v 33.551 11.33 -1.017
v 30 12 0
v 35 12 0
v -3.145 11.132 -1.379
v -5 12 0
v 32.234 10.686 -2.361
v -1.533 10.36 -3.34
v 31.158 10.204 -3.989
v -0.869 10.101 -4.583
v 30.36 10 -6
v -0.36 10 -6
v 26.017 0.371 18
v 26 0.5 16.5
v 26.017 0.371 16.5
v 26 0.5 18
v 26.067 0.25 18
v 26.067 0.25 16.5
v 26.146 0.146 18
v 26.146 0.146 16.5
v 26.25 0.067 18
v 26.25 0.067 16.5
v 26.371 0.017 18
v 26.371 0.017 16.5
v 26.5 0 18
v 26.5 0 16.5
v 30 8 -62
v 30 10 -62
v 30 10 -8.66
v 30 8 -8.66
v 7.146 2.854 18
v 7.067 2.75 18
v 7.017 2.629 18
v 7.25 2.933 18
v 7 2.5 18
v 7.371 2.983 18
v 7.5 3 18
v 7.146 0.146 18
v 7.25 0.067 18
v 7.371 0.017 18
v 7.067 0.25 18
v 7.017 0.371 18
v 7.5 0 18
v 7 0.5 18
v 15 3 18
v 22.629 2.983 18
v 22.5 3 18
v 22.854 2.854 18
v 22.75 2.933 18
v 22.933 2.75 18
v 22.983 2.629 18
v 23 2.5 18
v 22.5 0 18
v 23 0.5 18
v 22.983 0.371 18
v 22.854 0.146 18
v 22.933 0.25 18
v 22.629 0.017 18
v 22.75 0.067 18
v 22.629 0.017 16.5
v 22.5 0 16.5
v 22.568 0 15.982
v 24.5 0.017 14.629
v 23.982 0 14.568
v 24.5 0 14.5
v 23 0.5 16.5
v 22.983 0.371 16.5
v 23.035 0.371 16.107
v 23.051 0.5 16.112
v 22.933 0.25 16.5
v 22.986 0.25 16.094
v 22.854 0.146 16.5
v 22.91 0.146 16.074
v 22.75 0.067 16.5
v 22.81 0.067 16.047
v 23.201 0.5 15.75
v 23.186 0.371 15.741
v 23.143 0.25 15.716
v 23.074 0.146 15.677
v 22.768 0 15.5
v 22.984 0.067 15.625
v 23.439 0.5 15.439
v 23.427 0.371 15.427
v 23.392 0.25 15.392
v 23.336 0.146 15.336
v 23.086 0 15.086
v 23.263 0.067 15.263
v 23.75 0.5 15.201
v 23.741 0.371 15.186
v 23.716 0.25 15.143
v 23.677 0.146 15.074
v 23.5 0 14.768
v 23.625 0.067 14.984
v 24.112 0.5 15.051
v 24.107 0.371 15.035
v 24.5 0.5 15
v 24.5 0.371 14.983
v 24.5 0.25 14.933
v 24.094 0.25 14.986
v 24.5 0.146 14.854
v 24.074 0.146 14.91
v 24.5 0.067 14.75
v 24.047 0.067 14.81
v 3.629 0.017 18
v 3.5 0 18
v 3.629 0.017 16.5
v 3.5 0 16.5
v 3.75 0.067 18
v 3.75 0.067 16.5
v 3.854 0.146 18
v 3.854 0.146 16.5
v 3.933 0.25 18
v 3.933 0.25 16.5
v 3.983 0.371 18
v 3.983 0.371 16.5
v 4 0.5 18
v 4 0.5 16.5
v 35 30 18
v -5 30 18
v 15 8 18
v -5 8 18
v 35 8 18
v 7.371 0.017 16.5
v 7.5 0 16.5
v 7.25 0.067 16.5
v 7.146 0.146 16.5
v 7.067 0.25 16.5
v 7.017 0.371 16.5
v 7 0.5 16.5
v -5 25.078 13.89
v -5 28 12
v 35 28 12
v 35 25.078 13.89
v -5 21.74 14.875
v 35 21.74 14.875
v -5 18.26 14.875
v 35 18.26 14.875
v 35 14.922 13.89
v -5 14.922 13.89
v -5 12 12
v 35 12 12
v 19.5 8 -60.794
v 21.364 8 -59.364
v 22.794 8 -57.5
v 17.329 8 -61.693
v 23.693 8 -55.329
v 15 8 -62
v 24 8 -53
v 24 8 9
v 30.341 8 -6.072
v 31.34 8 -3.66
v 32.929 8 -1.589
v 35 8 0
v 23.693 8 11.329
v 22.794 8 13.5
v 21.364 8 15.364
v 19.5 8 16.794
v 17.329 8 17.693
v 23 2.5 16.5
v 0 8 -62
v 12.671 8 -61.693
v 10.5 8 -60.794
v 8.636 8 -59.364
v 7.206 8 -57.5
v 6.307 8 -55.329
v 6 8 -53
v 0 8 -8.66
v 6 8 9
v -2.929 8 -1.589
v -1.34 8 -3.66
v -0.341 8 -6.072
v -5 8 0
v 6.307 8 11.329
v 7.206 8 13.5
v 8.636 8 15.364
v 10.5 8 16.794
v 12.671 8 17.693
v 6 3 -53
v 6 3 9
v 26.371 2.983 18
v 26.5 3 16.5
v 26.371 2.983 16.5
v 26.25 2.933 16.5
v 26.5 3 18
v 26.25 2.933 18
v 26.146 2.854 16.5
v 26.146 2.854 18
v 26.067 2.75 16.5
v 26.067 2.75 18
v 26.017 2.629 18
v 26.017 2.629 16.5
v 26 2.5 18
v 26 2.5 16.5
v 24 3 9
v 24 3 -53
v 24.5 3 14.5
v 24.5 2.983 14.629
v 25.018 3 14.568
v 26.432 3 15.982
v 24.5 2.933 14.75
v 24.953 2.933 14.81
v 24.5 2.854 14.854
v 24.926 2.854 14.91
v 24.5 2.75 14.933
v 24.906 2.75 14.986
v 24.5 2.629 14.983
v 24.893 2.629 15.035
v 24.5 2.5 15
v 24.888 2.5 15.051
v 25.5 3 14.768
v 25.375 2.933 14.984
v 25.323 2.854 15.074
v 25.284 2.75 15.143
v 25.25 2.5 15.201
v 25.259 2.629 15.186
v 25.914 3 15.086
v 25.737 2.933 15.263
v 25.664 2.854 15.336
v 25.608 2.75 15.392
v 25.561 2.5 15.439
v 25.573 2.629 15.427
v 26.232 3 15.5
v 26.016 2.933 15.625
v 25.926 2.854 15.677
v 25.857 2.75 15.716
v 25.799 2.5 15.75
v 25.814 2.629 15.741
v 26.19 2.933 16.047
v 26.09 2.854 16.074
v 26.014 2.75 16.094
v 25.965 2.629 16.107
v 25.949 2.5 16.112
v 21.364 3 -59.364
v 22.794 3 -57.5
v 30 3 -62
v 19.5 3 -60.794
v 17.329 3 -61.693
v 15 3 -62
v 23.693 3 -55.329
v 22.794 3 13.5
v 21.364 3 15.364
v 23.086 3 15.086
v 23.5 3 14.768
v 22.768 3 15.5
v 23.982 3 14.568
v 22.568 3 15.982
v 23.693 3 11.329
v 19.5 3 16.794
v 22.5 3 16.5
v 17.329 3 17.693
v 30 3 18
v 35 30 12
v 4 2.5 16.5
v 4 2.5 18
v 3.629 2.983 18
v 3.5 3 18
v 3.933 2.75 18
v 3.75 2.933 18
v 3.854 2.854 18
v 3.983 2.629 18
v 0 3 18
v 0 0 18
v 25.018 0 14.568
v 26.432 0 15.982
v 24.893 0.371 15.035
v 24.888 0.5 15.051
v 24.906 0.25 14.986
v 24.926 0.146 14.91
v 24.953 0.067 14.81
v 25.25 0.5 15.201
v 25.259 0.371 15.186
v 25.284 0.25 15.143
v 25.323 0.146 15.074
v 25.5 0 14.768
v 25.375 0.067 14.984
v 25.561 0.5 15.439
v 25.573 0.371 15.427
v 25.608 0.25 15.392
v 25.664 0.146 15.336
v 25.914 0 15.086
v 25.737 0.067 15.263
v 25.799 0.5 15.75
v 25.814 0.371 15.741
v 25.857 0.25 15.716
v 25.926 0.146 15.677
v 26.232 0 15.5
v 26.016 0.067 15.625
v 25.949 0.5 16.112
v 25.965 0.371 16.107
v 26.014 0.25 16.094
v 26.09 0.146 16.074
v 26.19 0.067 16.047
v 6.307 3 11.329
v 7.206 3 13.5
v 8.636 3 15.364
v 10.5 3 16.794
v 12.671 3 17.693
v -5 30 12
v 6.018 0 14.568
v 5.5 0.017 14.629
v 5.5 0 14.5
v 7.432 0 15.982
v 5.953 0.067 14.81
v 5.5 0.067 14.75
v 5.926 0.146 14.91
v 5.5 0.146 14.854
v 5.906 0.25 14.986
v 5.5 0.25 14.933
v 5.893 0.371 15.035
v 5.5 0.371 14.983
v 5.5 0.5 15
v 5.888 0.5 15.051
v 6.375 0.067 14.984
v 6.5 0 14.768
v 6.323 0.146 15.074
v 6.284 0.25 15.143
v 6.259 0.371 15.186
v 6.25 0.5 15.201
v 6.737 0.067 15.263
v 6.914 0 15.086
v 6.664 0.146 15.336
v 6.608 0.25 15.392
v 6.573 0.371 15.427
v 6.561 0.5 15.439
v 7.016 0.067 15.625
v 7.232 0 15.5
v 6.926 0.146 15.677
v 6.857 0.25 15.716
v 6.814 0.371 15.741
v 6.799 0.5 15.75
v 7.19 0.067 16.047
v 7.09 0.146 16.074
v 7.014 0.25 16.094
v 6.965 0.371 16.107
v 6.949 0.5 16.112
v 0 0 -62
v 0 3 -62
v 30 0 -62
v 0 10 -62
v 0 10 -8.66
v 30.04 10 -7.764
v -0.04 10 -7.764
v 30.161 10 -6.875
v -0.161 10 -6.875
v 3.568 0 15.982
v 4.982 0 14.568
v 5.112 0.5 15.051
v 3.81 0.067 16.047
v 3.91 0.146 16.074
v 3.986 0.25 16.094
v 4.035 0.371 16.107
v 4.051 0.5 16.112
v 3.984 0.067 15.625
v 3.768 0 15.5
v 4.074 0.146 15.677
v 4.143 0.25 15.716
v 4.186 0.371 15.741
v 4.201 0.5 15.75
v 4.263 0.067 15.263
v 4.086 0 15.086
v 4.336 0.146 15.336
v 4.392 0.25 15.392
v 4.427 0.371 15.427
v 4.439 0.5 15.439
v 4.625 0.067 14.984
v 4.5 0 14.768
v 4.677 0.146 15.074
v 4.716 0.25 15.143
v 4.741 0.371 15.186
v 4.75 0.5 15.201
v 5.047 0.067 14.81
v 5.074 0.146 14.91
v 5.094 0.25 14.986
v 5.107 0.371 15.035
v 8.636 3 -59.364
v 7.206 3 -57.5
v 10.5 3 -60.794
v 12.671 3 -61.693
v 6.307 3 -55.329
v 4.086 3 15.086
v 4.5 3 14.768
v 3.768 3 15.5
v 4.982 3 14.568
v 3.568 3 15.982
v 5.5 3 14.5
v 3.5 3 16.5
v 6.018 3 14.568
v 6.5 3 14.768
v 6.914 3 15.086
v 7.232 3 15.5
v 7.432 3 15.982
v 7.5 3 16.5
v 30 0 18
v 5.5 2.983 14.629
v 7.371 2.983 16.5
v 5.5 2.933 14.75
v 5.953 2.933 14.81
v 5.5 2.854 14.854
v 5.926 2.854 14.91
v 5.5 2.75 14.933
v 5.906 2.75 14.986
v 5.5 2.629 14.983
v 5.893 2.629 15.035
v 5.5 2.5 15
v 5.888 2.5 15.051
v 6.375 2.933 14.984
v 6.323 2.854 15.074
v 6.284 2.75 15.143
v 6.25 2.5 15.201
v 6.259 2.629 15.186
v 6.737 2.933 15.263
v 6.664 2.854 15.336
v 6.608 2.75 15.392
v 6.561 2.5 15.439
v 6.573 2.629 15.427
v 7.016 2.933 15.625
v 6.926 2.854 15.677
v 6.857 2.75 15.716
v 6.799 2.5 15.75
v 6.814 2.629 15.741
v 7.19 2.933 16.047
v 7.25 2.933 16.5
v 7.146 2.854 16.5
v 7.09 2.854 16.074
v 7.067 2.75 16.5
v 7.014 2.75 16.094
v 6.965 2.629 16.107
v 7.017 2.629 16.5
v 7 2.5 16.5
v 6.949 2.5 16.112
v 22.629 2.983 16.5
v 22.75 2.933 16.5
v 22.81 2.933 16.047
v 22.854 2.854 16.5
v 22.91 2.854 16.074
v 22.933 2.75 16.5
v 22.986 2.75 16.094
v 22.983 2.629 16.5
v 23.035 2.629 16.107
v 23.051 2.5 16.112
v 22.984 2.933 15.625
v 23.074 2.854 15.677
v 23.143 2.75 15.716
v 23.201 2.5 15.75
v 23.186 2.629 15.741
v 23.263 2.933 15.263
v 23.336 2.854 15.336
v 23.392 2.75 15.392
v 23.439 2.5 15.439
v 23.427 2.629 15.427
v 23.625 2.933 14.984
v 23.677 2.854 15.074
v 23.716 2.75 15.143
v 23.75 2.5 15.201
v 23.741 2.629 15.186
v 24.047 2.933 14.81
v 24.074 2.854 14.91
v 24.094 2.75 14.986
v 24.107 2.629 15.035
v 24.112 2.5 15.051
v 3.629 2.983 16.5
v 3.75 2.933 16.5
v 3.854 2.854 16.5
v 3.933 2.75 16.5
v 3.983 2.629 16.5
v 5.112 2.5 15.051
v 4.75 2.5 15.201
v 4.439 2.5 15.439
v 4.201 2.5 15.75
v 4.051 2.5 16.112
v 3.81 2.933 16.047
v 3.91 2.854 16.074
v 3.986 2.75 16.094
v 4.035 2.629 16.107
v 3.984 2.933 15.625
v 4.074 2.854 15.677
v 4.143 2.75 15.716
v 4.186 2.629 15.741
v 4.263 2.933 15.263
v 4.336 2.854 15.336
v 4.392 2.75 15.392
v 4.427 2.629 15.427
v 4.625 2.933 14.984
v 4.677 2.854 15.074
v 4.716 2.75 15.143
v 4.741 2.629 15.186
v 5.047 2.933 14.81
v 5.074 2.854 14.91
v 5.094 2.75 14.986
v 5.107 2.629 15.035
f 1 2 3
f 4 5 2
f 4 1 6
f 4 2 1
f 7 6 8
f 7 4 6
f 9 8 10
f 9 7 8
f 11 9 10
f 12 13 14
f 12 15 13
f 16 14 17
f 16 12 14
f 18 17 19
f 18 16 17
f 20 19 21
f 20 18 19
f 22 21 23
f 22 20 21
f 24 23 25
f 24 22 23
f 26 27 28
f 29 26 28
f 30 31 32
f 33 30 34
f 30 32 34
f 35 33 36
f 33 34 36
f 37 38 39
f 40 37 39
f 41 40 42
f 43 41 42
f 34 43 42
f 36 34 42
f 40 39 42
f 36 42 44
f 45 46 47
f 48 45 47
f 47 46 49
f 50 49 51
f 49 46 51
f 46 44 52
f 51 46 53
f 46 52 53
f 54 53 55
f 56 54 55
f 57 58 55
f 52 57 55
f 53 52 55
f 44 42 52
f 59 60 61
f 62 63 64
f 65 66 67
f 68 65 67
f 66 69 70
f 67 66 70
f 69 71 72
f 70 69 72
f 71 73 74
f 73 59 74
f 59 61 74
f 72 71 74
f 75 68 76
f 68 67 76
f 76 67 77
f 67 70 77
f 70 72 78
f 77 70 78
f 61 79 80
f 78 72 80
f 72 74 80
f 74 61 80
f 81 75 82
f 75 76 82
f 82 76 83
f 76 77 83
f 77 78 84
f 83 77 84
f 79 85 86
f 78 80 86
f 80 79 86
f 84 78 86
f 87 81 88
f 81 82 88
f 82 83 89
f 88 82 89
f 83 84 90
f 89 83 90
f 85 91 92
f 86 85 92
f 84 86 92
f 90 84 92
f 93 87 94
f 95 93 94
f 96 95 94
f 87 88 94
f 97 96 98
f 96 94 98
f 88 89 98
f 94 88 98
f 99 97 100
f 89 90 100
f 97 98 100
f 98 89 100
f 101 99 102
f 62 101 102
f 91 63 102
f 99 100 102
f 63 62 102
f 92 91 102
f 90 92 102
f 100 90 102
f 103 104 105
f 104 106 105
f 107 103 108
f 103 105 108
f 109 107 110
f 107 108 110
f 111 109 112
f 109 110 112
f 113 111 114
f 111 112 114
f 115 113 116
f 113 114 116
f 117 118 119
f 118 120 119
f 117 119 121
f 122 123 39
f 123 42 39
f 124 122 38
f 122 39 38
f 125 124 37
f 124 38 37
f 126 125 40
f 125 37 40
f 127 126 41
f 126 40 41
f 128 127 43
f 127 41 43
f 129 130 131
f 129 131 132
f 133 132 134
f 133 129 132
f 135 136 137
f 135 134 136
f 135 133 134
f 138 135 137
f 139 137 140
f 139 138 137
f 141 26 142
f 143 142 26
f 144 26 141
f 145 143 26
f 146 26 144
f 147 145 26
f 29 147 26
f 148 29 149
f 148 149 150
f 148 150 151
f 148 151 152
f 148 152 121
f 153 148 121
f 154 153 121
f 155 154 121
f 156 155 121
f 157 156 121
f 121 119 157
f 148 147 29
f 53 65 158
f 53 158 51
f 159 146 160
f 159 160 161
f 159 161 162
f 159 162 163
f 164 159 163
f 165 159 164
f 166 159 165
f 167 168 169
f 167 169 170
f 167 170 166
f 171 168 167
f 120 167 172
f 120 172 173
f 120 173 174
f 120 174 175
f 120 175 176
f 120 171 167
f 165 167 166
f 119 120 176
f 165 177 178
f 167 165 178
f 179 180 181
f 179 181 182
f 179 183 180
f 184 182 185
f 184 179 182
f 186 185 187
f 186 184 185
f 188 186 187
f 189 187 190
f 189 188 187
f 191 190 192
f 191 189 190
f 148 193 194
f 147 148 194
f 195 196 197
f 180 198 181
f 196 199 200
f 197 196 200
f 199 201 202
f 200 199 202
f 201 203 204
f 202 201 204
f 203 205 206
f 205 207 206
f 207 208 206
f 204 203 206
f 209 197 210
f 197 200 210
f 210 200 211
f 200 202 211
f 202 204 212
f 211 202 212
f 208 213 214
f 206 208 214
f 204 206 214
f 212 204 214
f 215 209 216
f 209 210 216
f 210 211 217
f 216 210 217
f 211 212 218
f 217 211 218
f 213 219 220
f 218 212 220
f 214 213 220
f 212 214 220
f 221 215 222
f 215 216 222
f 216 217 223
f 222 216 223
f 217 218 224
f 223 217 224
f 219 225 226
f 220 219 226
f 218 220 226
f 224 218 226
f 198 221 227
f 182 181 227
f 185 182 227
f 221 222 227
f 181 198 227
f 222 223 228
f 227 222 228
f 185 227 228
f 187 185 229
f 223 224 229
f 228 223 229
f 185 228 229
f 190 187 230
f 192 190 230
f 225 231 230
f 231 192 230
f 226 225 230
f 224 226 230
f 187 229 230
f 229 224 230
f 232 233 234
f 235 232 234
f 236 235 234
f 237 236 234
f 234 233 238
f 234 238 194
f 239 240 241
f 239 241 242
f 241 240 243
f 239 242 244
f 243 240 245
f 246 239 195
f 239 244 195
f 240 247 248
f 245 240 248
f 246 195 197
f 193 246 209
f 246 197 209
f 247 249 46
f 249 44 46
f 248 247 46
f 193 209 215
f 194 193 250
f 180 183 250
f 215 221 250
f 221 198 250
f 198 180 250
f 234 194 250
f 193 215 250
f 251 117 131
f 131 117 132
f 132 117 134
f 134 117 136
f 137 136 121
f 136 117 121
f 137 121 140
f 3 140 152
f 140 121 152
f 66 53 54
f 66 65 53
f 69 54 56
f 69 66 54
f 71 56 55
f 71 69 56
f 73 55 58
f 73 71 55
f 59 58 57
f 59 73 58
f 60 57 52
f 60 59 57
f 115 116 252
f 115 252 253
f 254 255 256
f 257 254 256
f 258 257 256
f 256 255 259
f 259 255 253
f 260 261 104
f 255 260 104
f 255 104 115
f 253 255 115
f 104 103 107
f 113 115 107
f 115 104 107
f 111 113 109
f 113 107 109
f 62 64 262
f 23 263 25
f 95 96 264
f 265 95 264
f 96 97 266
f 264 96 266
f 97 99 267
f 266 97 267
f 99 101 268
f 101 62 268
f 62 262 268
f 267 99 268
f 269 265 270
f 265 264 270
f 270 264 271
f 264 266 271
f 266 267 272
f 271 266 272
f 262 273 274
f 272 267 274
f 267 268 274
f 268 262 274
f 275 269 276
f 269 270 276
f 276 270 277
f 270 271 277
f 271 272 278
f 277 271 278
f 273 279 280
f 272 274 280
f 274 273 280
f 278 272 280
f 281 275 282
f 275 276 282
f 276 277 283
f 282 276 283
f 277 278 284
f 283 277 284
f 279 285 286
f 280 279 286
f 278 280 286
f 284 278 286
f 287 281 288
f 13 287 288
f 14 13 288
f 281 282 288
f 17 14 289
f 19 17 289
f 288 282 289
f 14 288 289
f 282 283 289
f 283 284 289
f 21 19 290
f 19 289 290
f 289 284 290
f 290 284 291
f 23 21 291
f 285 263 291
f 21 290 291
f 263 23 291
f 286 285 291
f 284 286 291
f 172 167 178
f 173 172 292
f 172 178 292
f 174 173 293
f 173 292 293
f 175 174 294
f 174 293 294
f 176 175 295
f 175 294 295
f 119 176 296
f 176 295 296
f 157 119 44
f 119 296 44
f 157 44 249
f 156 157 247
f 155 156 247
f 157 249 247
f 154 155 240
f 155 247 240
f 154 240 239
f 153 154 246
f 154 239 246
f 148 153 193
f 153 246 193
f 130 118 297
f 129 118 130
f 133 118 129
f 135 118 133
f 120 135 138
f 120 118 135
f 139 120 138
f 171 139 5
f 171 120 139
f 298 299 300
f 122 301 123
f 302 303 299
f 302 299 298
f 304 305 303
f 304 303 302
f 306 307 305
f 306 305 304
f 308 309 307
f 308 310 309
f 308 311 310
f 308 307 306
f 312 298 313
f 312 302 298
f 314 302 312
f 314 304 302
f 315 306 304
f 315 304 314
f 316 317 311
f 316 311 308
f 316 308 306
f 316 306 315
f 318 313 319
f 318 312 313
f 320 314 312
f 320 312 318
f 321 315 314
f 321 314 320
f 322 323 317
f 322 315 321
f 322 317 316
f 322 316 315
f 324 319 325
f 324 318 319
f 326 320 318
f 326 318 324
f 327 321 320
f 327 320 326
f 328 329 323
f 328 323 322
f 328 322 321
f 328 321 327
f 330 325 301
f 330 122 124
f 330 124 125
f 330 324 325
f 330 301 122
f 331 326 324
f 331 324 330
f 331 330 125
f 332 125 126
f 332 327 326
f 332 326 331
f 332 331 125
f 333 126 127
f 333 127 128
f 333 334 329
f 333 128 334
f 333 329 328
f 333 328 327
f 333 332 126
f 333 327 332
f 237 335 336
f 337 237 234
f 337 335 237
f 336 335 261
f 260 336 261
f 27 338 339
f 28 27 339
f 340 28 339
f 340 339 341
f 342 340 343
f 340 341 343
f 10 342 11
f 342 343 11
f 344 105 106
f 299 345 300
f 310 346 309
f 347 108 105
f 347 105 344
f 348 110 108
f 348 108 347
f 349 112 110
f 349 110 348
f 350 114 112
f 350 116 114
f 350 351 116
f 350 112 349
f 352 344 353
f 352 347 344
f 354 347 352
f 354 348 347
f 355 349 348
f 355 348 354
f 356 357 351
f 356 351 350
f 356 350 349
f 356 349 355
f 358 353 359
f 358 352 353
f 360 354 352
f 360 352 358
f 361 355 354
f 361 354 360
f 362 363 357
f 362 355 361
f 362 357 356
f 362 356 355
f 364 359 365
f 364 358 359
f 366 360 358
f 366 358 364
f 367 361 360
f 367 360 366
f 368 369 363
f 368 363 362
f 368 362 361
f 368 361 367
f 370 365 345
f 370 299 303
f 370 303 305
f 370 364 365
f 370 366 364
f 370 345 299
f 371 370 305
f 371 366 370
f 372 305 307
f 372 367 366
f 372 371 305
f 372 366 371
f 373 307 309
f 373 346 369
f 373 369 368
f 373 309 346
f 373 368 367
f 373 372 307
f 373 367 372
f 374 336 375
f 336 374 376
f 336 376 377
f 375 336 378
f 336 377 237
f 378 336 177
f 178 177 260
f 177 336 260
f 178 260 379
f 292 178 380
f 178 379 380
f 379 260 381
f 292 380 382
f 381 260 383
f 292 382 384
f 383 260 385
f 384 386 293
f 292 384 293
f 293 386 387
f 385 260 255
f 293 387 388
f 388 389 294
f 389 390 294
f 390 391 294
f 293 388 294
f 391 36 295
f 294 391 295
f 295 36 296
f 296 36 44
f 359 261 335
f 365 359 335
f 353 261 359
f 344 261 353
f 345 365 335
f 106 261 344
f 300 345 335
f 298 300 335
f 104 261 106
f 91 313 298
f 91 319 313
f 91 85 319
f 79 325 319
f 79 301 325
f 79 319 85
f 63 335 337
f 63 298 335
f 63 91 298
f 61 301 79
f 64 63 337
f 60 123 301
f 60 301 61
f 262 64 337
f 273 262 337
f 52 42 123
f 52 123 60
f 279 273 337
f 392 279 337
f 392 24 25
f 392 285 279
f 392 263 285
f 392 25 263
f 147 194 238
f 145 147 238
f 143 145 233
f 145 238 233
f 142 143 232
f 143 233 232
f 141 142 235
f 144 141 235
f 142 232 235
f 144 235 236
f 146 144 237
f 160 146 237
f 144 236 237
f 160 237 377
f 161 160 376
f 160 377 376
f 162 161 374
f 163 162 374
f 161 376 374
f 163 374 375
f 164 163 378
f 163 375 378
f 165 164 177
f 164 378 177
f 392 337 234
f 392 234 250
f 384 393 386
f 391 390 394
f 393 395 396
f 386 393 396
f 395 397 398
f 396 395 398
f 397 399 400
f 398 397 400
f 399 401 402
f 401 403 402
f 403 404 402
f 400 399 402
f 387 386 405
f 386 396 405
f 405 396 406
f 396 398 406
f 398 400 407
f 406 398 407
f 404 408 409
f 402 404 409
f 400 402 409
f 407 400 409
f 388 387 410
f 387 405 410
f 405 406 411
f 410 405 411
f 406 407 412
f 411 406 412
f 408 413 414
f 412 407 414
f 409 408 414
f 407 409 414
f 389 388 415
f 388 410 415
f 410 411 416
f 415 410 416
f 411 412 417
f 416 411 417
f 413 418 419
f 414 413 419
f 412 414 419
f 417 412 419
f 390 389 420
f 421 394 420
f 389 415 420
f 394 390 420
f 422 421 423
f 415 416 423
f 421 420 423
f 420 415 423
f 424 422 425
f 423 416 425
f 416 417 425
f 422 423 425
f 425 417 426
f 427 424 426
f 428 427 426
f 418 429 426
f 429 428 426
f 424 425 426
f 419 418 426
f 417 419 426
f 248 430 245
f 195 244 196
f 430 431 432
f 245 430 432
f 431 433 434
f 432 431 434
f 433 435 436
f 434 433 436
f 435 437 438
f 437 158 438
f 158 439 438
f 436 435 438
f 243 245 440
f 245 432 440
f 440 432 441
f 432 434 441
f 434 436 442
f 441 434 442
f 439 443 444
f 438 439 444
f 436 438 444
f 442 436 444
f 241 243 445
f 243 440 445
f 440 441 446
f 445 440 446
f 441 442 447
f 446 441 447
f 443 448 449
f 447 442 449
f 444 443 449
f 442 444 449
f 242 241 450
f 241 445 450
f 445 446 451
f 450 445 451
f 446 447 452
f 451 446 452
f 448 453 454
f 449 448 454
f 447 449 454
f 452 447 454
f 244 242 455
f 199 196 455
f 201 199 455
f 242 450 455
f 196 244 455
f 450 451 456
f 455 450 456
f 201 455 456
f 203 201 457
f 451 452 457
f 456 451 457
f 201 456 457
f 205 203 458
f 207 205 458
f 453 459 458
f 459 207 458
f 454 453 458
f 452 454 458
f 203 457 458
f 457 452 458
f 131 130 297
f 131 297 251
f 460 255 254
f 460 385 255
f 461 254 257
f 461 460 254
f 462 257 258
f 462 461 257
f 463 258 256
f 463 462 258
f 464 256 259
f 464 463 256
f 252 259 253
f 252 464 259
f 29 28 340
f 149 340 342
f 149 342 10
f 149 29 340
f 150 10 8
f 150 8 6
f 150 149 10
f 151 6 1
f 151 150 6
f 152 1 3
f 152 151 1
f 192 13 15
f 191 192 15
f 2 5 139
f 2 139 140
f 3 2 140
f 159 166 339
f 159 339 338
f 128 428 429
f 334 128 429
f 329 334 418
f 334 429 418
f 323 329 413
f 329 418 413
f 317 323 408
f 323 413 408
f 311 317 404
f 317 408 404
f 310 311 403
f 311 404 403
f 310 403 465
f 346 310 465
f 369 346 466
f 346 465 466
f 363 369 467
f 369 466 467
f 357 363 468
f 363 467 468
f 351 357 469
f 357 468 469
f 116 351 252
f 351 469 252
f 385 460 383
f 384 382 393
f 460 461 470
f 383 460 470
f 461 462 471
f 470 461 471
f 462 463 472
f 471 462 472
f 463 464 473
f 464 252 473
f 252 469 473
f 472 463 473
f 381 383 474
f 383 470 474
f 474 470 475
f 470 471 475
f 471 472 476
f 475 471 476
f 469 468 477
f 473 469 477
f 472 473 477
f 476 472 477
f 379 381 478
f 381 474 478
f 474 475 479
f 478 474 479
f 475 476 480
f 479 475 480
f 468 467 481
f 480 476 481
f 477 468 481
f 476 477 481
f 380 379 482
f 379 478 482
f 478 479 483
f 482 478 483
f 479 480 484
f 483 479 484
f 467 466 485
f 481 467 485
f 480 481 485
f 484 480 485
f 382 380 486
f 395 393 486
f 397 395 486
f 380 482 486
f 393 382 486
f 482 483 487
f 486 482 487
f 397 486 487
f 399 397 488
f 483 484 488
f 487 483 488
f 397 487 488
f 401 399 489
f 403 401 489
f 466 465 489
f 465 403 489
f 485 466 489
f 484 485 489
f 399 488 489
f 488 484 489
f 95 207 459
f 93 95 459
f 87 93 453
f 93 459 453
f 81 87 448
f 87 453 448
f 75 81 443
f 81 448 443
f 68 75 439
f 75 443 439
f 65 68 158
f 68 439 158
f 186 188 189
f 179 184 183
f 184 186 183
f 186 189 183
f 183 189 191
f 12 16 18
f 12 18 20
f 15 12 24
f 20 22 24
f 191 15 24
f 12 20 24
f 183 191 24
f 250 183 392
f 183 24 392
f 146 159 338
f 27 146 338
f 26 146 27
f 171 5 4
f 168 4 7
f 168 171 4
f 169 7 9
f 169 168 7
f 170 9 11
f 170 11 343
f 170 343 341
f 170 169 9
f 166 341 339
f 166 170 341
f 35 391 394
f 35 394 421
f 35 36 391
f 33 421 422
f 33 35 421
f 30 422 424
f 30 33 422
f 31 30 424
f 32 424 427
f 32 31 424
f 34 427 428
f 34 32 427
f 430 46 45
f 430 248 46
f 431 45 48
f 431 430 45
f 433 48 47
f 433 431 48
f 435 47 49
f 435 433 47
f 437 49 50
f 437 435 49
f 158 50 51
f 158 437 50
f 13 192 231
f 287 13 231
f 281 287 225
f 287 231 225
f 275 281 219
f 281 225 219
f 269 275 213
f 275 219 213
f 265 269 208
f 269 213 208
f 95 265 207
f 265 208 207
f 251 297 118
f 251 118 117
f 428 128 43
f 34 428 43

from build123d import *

# Parameters (mm, degrees)
SKETCH2_W                        = 30
SKETCH2_H                        = 18
EXTRUDE_BASE_DEPTH               = 3
SKETCH3_R                        = 9
EXTRUDE_CYLINDER_DEPTH           = 5
SKETCH4_W                        = 40
SKETCH4_H                        = 18
EXTRUDE_PHONE_FLOOR_DEPTH        = 4
SKETCH5_W                        = 40
SKETCH5_H                        = 6
EXTRUDE_PHONE_ROOF_DEPTH         = 18
CUT_PHONE_CRADLE_DEPTH           = 54.141321022
CUT_PHONE_CRADLE_DEPTH_BACK      = 54.141321022
CUT_RUBBER_BAND_HOLDERS_REACH    = 51.487
SKETCH7_W                        = 3
SKETCH7_H                        = 3
FILLET_RUBBER_BAND_HOLDERS_R     = 1.5
FILLET_RUBBER_BAND_HOLDERS_R_2   = 0.5
SKETCH8_W                        = 30
SKETCH8_H                        = 62
EXTRUDE_BASE_EXTENSION_DEPTH     = 3
EXTRUDE_CYLINDER_EXTENSION_DEPTH = 5
SKETCH10_W                       = 30
SKETCH10_H                       = 62
EXTRUDE_FLOOR_EXTENSION_DEPTH    = 2
FILLET1_R                        = 10


# Some blends are built 0.0001 mm under size
with BuildPart() as part:
    # Sketch2 → Extrude-Base (new body)
    with BuildSketch(Plane(origin=(0, 0, 0), x_dir=(1, 0, 0), z_dir=(0, 1, 0))):
        with Locations((15, -9)):
            Rectangle(SKETCH2_W, SKETCH2_H)
    extrude(amount=EXTRUDE_BASE_DEPTH)

    # Sketch3 → Extrude-Cylinder (add)
    with BuildSketch(Plane(origin=(0, 3, 0), x_dir=(1, 0, 0), z_dir=(0, 1, 0))):
        with Locations(Location((15, -9, 0), (0, 0, 270))):
            Circle(SKETCH3_R)
    extrude(amount=EXTRUDE_CYLINDER_DEPTH)

    # Sketch4 → Extrude-Phone Floor (add)
    with BuildSketch(Plane(origin=(0, 8, 0), x_dir=(1, 0, 0), z_dir=(0, 1, 0))):
        with Locations((15, -9)):
            Rectangle(SKETCH4_W, SKETCH4_H)
    extrude(amount=EXTRUDE_PHONE_FLOOR_DEPTH)

    # Sketch5 → Extrude-Phone Roof (add)
    with BuildSketch(Plane(origin=(0, 12, 0), x_dir=(1, 0, 0), z_dir=(0, 1, 0))):
        with Locations((15, -15)):
            Rectangle(SKETCH5_W, SKETCH5_H)
    extrude(amount=EXTRUDE_PHONE_ROOF_DEPTH)

    # Sketch6 → Cut-Phone Cradle (cut, two sides: drawn at the far end of the back side and taken through both)
    with BuildSketch(Plane(origin=(35, 0, 0), x_dir=(0, 0, -1), z_dir=(1, 0, 0)).offset(-CUT_PHONE_CRADLE_DEPTH_BACK)):
        with BuildLine():
            Line((-12, 12), (-12, 28))
            ThreePointArc((-12, 28), (-15, 20), (-12, 12))
        make_face()
    extrude(amount=CUT_PHONE_CRADLE_DEPTH + CUT_PHONE_CRADLE_DEPTH_BACK, mode=Mode.SUBTRACT)

    # Sketch7 → Cut-Rubber Band Holders (cut, up to next)
    with BuildSketch(Plane.XZ, mode=Mode.PRIVATE) as cut_rubber_band_holders_sk1:
        with Locations((24.5, 16.5)):
            Rectangle(SKETCH7_W, SKETCH7_H)
    cut_rubber_band_holders_tool1 = extrude(cut_rubber_band_holders_sk1.sketch, amount=-CUT_RUBBER_BAND_HOLDERS_REACH, mode=Mode.PRIVATE) & part.part
    # Sketch7 → Cut-Rubber Band Holders (cut, up to next)
    with BuildSketch(Plane.XZ, mode=Mode.PRIVATE) as cut_rubber_band_holders_sk2:
        with Locations((5.5, 16.5)):
            Rectangle(SKETCH7_W, SKETCH7_H)
    cut_rubber_band_holders_tool2 = extrude(cut_rubber_band_holders_sk2.sketch, amount=-CUT_RUBBER_BAND_HOLDERS_REACH, mode=Mode.PRIVATE) & part.part
    add(cut_rubber_band_holders_tool1.solids().sort_by_distance((24.5, 0, 16.5))[0], mode=Mode.SUBTRACT)
    add(cut_rubber_band_holders_tool2.solids().sort_by_distance((5.5, 0, 16.5))[0], mode=Mode.SUBTRACT)

    # Fillet-Rubber Band Holders
    fillet_rubber_band_holders_edges = [part.edges().sort_by_distance(p)[0] for p in [
        (26, 1.5, 15),
        (7, 1.5, 15),
        (23, 1.5, 15),
        (4, 1.5, 15),
    ]]
    fillet(fillet_rubber_band_holders_edges, radius=FILLET_RUBBER_BAND_HOLDERS_R - 0.0001)  # a hair under: the kernel refuses the full size
    fillet_rubber_band_holders_2_edges = [part.edges().sort_by_distance(p)[0] for p in [
        (24.5, 3, 15),
        (24.5, 0, 15),
        (5.5, 0, 15),
        (5.5, 3, 15),
        (6.560689461, 3, 15.439310539),
        (4.439310539, 3, 15.439310539),
        (4.439310539, 0, 15.439310539),
        (6.560689461, 0, 15.439310539),
        (23.439310539, 0, 15.439310539),
        (25.560689461, 0, 15.439310539),
        (25.560689461, 3, 15.439310539),
        (23.439310539, 3, 15.439310539),
    ]]
    fillet(fillet_rubber_band_holders_2_edges, radius=FILLET_RUBBER_BAND_HOLDERS_R_2)

    # Sketch8 → Extrude-Base Extension (add)
    with BuildSketch(Plane.XZ):
        with Locations((15, -31)):
            Rectangle(SKETCH8_W, SKETCH8_H)
    extrude(amount=-EXTRUDE_BASE_EXTENSION_DEPTH)

    # Sketch9 → Extrude-Cylinder Extension (add)
    with BuildSketch(Plane(origin=(0, 3, 0), x_dir=(1, 0, 0), z_dir=(0, 1, 0))):
        with BuildLine():
            Line((24, -9), (24, 53))
            ThreePointArc((24, 53), (15, 62), (6, 53))
            Line((6, 53), (6, -9))
            ThreePointArc((6, -9), (15, 0), (24, -9))
        make_face()
    extrude(amount=EXTRUDE_CYLINDER_EXTENSION_DEPTH)

    # Sketch10 → Extrude-Floor Extension (add)
    with BuildSketch(Plane(origin=(0, 8, 0), x_dir=(1, 0, 0), z_dir=(0, 1, 0))):
        with Locations((15, 31)):
            Rectangle(SKETCH10_W, SKETCH10_H)
    extrude(amount=EXTRUDE_FLOOR_EXTENSION_DEPTH)

    # Fillet1
    # the kernel refuses this fillet: 10 mm, written as the material it adds along each edge
    with BuildSketch(Plane(origin=(0, 8, 0), x_dir=(0, 0, -1), z_dir=(0, 1, 0))) as fillet1_piece_1:
        with BuildLine():
            CenterArc((8.660254038, 10), FILLET1_R, 210, 60)
            Line((0, 5), (-0.173205081, 4.9))
            ThreePointArc((-0.173205081, 4.9), (-0.2, 2.5), (-0.2, 0))
            Line((-0.2, 0), (0, -0.2))
            Line((0, -0.2), (8.660254038, -0.2))
            Line((8.660254038, -0.2), (8.660254038, 0))
        make_face()
    extrude(amount=2)
    with BuildSketch(Plane(origin=(0, 10, 0), x_dir=(0, 0, -1), z_dir=(1, 0, 0))) as fillet1_piece_2:
        with BuildLine():
            CenterArc((6, 10), FILLET1_R, 233.130102354, 36.869897646)
            Line((0, 2), (-0.12, 1.84))
            ThreePointArc((-0.12, 1.84), (-0.2, 1), (-0.2, 0))
            Line((-0.2, 0), (0, -0.2))
            Line((0, -0.2), (6, -0.2))
            Line((6, -0.2), (6, 0))
        make_face()
    extrude(amount=30)
    with BuildSketch(Plane(origin=(30, 8, 0), x_dir=(0, 0, -1), z_dir=(0, 1, 0))) as fillet1_piece_3:
        with BuildLine():
            CenterArc((8.660254038, -10), FILLET1_R, 90, 60)
            Line((0, -5), (-0.173205081, -4.9))
            ThreePointArc((-0.173205081, -4.9), (-0.2, -2.5), (-0.2, 0))
            Line((-0.2, 0), (0, 0.2))
            Line((0, 0.2), (8.660254038, 0.2))
            Line((8.660254038, 0.2), (8.660254038, 0))
        make_face()
    extrude(amount=2)
    with BuildSketch(Plane(origin=(-15, 10, 0), x_dir=(0, 0, -1), z_dir=(1, 0, 0))) as fillet1_piece_4a_section:
        with BuildLine():
            CenterArc((6, 10), FILLET1_R, 233.130102354, 36.869897646)
            Line((0, 2), (-0.12, 1.84))
            ThreePointArc((-0.12, 1.84), (-0.2, 1), (-0.2, 0))
            Line((-0.2, 0), (0, -0.2))
            Line((0, -0.2), (6, -0.2))
            Line((6, -0.2), (6, 0))
        make_face()
    fillet1_piece_4a = extrude(amount=45, mode=Mode.PRIVATE)
    fillet1_piece_4a = split(fillet1_piece_4a, bisect_by=Plane(origin=(0, 10.452376795, -1.699345627), z_dir=(-1, 0, 0)), keep=Keep.TOP, mode=Mode.PRIVATE)
    fillet1_piece_4a = split(fillet1_piece_4a, bisect_by=Plane(origin=(-5, 10.452376795, -1.699345627), z_dir=(1, 0, 0)), keep=Keep.TOP, mode=Mode.PRIVATE)
    with BuildSketch(Plane(origin=(0, 8, 0), x_dir=(0, 0, -1), z_dir=(0, 1, 0))) as fillet1_piece_4b_section:
        with BuildLine():
            CenterArc((8.660254038, 10), FILLET1_R, 210, 60)
            Line((0, 5), (-0.173205081, 4.9))
            ThreePointArc((-0.173205081, 4.9), (-0.2, 2.5), (-0.2, 0))
            Line((-0.2, 0), (0, -0.2))
            Line((0, -0.2), (8.660254038, -0.2))
            Line((8.660254038, -0.2), (8.660254038, 0))
        make_face()
    fillet1_piece_4b = extrude(amount=23.650635095, mode=Mode.PRIVATE)
    fillet1_piece_4b = split(fillet1_piece_4b, bisect_by=Plane(origin=(-1.295167111, 10, -2.163104458), z_dir=(0, 1, 0)), keep=Keep.TOP, mode=Mode.PRIVATE)
    fillet1_piece_4b = split(fillet1_piece_4b, bisect_by=Plane(origin=(-1.295167111, 12, -2.163104458), z_dir=(0, -1, 0)), keep=Keep.TOP, mode=Mode.PRIVATE)
    fillet1_piece_4 = fillet1_piece_4a & fillet1_piece_4b
    add(fillet1_piece_4)
    with BuildSketch(Plane(origin=(0, 10, 0), x_dir=(0, 0, -1), z_dir=(1, 0, 0))) as fillet1_piece_5a_section:
        with BuildLine():
            CenterArc((6, 10), FILLET1_R, 233.130102354, 36.869897646)
            Line((0, 2), (-0.12, 1.84))
            ThreePointArc((-0.12, 1.84), (-0.2, 1), (-0.2, 0))
            Line((-0.2, 0), (0, -0.2))
            Line((0, -0.2), (6, -0.2))
            Line((6, -0.2), (6, 0))
        make_face()
    fillet1_piece_5a = extrude(amount=45, mode=Mode.PRIVATE)
    fillet1_piece_5a = split(fillet1_piece_5a, bisect_by=Plane(origin=(30, 10.452376795, -1.699345627), z_dir=(1, 0, 0)), keep=Keep.TOP, mode=Mode.PRIVATE)
    fillet1_piece_5a = split(fillet1_piece_5a, bisect_by=Plane(origin=(35, 10.452376795, -1.699345627), z_dir=(-1, 0, 0)), keep=Keep.TOP, mode=Mode.PRIVATE)
    with BuildSketch(Plane(origin=(30, 8, 0), x_dir=(0, 0, -1), z_dir=(0, 1, 0))) as fillet1_piece_5b_section:
        with BuildLine():
            CenterArc((8.660254038, -10), FILLET1_R, 90, 60)
            Line((0, -5), (-0.173205081, -4.9))
            ThreePointArc((-0.173205081, -4.9), (-0.2, -2.5), (-0.2, 0))
            Line((-0.2, 0), (0, 0.2))
            Line((0, 0.2), (8.660254038, 0.2))
            Line((8.660254038, 0.2), (8.660254038, 0))
        make_face()
    fillet1_piece_5b = extrude(amount=23.650635095, mode=Mode.PRIVATE)
    fillet1_piece_5b = split(fillet1_piece_5b, bisect_by=Plane(origin=(31.295167111, 10, -2.163104458), z_dir=(0, 1, 0)), keep=Keep.TOP, mode=Mode.PRIVATE)
    fillet1_piece_5b = split(fillet1_piece_5b, bisect_by=Plane(origin=(31.295167111, 12, -2.163104458), z_dir=(0, -1, 0)), keep=Keep.TOP, mode=Mode.PRIVATE)
    fillet1_piece_5 = fillet1_piece_5a & fillet1_piece_5b
    add(fillet1_piece_5)


solid = part.part
